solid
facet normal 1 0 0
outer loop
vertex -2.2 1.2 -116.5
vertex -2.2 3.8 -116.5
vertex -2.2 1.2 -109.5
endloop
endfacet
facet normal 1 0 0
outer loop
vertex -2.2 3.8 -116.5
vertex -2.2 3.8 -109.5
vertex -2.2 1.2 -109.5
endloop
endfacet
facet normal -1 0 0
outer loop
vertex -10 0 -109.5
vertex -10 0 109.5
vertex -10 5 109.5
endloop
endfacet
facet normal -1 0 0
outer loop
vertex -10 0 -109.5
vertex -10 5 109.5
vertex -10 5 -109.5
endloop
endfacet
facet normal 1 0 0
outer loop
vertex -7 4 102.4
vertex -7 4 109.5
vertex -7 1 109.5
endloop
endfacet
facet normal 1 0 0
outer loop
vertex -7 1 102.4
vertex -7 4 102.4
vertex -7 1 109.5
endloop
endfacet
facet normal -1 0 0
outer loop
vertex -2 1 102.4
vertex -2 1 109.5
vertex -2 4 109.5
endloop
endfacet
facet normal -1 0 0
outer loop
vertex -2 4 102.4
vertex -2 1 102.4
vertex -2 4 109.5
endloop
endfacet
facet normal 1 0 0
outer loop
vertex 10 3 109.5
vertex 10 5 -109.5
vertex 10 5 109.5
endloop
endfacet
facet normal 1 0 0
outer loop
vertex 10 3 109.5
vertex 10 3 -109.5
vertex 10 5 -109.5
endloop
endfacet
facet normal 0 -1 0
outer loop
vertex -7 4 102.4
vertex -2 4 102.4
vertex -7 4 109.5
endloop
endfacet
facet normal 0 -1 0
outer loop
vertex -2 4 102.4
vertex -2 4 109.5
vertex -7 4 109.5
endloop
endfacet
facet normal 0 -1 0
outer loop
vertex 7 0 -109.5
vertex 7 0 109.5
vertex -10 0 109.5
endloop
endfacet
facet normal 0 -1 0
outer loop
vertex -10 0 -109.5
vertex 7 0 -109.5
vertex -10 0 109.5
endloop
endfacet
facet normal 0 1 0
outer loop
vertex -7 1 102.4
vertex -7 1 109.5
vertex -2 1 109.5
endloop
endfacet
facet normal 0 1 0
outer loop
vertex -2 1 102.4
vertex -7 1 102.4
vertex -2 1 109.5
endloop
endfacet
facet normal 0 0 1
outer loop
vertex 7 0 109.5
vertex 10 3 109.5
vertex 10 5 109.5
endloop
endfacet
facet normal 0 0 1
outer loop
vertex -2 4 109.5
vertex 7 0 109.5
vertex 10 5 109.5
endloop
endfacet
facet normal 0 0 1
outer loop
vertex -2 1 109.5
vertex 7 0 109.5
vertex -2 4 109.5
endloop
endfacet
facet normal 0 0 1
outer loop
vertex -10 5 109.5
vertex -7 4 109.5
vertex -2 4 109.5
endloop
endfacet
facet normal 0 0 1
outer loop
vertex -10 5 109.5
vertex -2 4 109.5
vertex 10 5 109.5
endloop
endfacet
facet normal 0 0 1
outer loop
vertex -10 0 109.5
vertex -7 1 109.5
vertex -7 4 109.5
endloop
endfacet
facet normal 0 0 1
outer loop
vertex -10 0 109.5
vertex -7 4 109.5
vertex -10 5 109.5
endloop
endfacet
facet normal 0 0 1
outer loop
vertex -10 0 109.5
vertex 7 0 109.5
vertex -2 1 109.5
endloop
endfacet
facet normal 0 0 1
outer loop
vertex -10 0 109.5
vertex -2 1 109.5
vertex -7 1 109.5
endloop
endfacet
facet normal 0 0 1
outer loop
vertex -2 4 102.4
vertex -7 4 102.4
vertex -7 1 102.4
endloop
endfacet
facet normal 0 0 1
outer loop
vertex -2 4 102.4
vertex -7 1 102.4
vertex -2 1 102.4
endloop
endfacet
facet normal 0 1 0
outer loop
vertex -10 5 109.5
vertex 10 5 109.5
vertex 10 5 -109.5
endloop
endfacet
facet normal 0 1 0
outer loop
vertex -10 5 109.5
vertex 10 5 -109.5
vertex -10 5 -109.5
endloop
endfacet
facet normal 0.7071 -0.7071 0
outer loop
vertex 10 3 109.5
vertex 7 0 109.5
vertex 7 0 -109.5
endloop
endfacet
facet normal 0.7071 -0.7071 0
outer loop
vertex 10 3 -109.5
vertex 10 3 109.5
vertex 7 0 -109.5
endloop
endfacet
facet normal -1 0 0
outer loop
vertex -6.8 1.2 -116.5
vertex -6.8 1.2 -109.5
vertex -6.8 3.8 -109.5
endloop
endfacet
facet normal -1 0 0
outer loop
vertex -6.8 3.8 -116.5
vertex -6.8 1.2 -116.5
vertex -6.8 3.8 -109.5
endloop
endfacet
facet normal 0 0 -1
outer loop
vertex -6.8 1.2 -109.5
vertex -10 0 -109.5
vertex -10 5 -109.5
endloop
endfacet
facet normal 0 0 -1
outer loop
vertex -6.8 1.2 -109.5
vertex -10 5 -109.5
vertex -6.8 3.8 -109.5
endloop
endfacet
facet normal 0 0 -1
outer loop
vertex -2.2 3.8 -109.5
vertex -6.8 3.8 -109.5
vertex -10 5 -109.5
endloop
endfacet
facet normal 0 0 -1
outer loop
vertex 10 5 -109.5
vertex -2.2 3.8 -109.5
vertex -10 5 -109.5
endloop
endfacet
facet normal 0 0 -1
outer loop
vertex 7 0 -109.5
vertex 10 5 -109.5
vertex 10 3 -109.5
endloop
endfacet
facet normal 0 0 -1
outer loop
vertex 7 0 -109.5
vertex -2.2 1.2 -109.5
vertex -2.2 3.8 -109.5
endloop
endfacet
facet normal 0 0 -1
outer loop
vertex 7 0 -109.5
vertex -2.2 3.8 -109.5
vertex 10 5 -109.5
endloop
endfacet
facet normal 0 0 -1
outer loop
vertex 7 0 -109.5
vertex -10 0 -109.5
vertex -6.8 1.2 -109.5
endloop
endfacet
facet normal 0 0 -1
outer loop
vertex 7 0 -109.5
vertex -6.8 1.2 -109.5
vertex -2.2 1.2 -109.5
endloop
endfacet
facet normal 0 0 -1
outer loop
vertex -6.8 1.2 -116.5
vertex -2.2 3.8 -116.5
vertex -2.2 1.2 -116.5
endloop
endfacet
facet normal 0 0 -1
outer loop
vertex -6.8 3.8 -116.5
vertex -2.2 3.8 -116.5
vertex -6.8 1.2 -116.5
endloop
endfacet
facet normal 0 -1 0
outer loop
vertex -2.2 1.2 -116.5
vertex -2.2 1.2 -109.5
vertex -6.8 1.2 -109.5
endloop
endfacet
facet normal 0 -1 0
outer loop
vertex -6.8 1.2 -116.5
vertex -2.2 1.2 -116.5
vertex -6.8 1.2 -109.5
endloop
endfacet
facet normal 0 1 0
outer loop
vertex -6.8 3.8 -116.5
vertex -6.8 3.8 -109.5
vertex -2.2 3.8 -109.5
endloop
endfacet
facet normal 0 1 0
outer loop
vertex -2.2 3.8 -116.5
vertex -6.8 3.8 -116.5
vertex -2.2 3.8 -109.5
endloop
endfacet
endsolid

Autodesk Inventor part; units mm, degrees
ref_plane "YZ Plane" through (0, 0, 0) normal (1, 0, 0) x (0, 1, 0)
ref_plane "XZ Plane" through (0, 0, 0) normal (0, 1, 0) x (-1, 0, 0)
ref_plane "XY Plane" through (0, 0, 0) normal (0, 0, 1) x (1, 0, 0)
sketch "Sketch1" plane through (0, 0, 0) normal (0, 1, 0) x (-1, 0, 0)
  line L0 (-10, 109.5) -> (10, 109.5)
  line L1 (10, 109.5) -> (10, -109.5)
  line L2 (10, -109.5) -> (-10, -109.5)
  line L3 (-10, -109.5) -> (-10, 109.5)
  line L4 (-10, 109.5) -> (10, -109.5) construction
  line L5 (10, 109.5) -> (-10, -109.5) construction
  point P0 (0, 0)
  dimension "d0" = 20
  dimension "d1" = 219
extrude "Extrusion1" add sketch "Sketch1" along normal blind 5
chamfer "Chamfer1" distance 3 angle 45 1 edges at (10, 0, 0)
sketch "Sketch3" plane through (-10, 5, 109.5) normal (0, 0, 1) x (1, 0, 0)
  line L0 (20, -2) -> (17, -5) projected
  line L1 (20, -2) -> (20, 0) projected
  line L2 (0, 0) -> (20, 0) projected
  line L3 (0, -5) -> (0, 0) projected
  line L4 (0, -5) -> (17, -5) projected
  line L5 (3, -4) -> (8, -4)
  line L6 (8, -4) -> (8, -1)
  line L7 (8, -1) -> (3, -1)
  line L8 (3, -1) -> (3, -4)
  line L9 (3, -4) -> (8, -1) construction
  line L10 (8, -4) -> (3, -1) construction
  point P0 (10, -5)
  point P1 (5.5, -2.5)
  point P2 (0, -2.5)
  dimension "d10" = 5
  dimension "d11" = 3
  dimension "d12" = 3
extrude "Extrusion3" cut sketch "Sketch3" against normal blind 7.1 contours L8 L7 L6 L5
sketch "Sketch4" plane through (10, 5, -109.5) normal (0, 0, -1) x (-1, 0, 0)
  line L0 (12, -1) -> (12, -4) projected
  line L1 (17, -1) -> (12, -1) projected
  line L2 (17, -4) -> (17, -1) projected
  line L3 (12, -4) -> (17, -4) projected
  line L4 (12.2, -1.2) -> (12.2, -3.8)
  line L5 (12.2, -3.8) -> (16.8, -3.8)
  line L6 (16.8, -3.8) -> (16.8, -1.2)
  line L7 (16.8, -1.2) -> (12.2, -1.2)
  point P0 (10, -5)
  dimension "d15" = 0.2
extrude "Extrusion4" add sketch "Sketch4" along normal blind 7 contours L7 L6 L5 L4
properties part number "SEPARADOR" material "Steel, Mild, Welded"
